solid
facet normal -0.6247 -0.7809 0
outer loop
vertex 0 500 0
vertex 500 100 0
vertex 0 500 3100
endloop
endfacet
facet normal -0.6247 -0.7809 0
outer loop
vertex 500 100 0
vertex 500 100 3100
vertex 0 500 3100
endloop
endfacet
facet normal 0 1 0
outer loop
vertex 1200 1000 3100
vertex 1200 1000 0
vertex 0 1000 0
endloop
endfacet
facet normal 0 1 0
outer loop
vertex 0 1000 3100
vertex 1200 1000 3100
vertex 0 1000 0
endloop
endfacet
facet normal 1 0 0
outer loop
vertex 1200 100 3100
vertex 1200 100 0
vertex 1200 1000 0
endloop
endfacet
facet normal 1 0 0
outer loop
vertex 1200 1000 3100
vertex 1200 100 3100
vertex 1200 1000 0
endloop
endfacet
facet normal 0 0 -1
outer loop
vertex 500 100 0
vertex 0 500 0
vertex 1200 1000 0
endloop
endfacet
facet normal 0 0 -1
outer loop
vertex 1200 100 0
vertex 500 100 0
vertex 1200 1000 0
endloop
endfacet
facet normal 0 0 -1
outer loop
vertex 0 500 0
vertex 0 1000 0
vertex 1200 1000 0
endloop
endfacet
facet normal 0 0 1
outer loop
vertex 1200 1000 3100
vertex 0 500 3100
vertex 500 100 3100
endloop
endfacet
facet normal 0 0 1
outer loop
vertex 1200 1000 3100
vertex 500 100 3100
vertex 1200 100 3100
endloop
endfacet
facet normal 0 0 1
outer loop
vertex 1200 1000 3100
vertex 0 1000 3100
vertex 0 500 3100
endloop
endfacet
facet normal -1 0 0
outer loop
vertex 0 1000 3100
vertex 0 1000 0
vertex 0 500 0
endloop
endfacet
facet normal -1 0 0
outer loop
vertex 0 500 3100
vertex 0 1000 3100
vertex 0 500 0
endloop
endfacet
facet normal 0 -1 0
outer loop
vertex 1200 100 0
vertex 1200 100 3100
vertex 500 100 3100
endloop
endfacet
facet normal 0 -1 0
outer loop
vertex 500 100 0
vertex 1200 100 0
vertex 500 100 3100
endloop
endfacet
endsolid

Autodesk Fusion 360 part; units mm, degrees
sketch "スケッチ1" plane through (0, 0, 0) normal (0, 1, 0) x (1, 0, 0)
sketch "スケッチ2" plane through (0, 0, 0) normal (0, 0, 1) x (1, 0, 0)
  line L0 (0, 0) -> (-10000, 0)
  line L1 (-10000, 0) -> (-10000, 8100)
  line L2 (-10000, 8100) -> (0, 8100)
  line L3 (0, 8100) -> (0, 0)
  line L4 (10, -10) -> (-10010, -10)
  line L5 (-10010, -10) -> (-10010, 8110)
  line L6 (-10010, 8110) -> (10, 8110)
  line L7 (10, 8110) -> (10, -10)
  point P0 (10, -10)
  dimension "d1" = 10000
  dimension "d2" = 8100
  dimension "d4" = 10020
  dimension "d5" = 8120
sketch "スケッチ3" plane through (0, 0, 0) normal (0, 0, 1) x (1, 0, 0)
sketch "スケッチ4" plane through (0, 0, 0) normal (0, 0, 1) x (1, 0, 0)
  line L0 (0, 0) -> (1200, 0)
  line L1 (1200, 0) -> (1200, 1000)
  line L2 (1200, 1000) -> (0, 1000)
  line L3 (0, 1000) -> (0, 0)
  dimension "d10" = 1200
  dimension "d11" = 1000
extrude "押し出し2" add sketch "スケッチ4" along normal blind 3100
sketch "スケッチ5" plane through (0, 0, 3100) normal (0, 0, 1) x (-1, 0, 0)
  line L0 (0, -1000) -> (0, 0)
  line L1 (0, 0) -> (-1200, 0)
  line L2 (-1200, 0) -> (-1200, -1000)
  line L3 (-1200, -1000) -> (0, -1000)
  line L4 (0, 0) -> (-1200, 0)
  line L5 (-1200, 0) -> (-1200, -100)
  line L6 (-1200, -100) -> (0, -100)
  line L7 (0, -100) -> (0, 0)
extrude "押し出し3" cut sketch "スケッチ5" against normal blind 3100 contours L0 L1 L2 L4 L5 L6 L7
sketch "スケッチ6" plane through (0, 0, 3100) normal (0, 0, 1) x (-1, 0, 0)
  line L0 (0, -100) -> (-1200, -100)
  line L1 (-1200, -100) -> (-1200, -1000)
  line L2 (-1200, -1000) -> (0, -1000)
  line L3 (0, -1000) -> (0, -100)
  line L4 (0, -100) -> (-500, -100)
  line L5 (0, -400) -> (0, -100)
  line L6 (0, -400) -> (0, -500)
  line L7 (-500, -100) -> (0, -500)
extrude "押し出し4" cut sketch "スケッチ6" against normal blind 3100 contours L0 L3 L4 L5 L6 L7
